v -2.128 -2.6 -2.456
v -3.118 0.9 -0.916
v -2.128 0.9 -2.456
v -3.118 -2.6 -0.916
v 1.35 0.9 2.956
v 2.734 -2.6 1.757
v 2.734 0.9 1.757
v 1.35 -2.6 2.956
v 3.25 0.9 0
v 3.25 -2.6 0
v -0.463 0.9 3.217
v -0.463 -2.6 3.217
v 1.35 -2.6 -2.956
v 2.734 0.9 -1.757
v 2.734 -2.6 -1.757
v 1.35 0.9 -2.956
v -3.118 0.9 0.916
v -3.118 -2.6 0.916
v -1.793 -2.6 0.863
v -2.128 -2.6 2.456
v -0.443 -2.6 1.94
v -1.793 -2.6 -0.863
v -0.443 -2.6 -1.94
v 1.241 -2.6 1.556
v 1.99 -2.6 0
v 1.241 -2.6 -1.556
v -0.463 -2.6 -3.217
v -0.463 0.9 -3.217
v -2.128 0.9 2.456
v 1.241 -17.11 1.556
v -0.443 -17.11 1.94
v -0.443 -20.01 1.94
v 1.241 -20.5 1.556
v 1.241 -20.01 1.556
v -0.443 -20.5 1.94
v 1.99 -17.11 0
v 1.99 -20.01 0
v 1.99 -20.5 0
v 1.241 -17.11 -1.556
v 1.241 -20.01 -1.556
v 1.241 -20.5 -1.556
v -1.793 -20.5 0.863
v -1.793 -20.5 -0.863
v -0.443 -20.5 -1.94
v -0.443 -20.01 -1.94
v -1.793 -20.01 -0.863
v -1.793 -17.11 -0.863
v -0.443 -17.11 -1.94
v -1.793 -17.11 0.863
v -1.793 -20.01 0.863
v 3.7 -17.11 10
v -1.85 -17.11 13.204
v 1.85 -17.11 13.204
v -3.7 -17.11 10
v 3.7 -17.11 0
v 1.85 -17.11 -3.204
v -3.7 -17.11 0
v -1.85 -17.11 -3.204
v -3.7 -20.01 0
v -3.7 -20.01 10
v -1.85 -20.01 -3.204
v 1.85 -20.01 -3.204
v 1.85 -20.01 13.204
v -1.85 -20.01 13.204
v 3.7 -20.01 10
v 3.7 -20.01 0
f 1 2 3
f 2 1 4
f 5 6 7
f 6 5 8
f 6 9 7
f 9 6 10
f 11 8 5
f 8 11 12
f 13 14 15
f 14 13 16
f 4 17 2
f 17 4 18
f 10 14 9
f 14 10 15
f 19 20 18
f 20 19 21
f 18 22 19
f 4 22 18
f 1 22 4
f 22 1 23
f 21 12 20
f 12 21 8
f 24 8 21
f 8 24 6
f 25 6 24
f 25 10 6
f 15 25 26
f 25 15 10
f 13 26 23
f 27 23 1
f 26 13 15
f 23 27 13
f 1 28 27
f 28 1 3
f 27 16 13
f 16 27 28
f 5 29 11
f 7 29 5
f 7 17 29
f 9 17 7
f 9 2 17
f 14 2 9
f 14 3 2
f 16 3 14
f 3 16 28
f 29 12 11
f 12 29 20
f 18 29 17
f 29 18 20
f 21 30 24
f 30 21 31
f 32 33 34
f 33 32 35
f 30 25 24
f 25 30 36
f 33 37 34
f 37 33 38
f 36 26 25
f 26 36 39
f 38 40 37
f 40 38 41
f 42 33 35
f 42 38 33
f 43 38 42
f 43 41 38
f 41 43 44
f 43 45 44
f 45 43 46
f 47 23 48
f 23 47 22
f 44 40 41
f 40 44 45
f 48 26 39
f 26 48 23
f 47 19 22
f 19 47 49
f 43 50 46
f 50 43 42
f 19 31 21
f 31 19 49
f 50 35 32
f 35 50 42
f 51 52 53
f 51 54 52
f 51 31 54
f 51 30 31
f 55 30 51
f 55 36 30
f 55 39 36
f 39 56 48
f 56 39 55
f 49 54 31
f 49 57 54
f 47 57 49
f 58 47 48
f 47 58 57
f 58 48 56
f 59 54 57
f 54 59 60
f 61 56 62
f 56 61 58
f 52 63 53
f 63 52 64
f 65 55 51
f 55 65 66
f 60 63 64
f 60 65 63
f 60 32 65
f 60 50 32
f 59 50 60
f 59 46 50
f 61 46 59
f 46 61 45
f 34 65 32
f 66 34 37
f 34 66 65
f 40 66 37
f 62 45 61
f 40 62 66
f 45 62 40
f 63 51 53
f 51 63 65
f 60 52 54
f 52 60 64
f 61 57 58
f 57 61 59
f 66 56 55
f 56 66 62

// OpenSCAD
// This file is part of Cyclone PCB Factory: an open-source 3D printable CNC machine for PCB manufacture
// http://reprap.org/wiki/Cyclone_PCB_Factory
// Original author: Carlosgs (http://carlosgs.es)
// License: CC BY-SA 4.0 (Attribution-ShareAlike 4.0 International, http://creativecommons.org/licenses/by-sa/4.0/)
// Designed with http://www.openscad.org/

include <MCAD/nuts_and_bolts.scad>

module hole_for_screw(size=3,length=20,nutDepth=5,nutAddedLen=0,captiveLen=0,tolerance=0.5) {
	radius = METRIC_NUT_AC_WIDTHS[size]/2+tolerance;
	height = METRIC_NUT_THICKNESS[size]+tolerance;
	translate([0,-length/2,0]) {
	translate([0,-length/2+height+nutAddedLen+nutDepth-0.01,0])
		scale([1,(height+nutAddedLen)/height,1])
			rotate([90,0,0])
				hull() {
					nutHole(size=size, tolerance=tolerance, proj=-1);
					translate([0,captiveLen,0])
						nutHole(size=size, tolerance=tolerance, proj=-1);
				}
	translate([0,length/2-2.6,0])
		rotate([90,0,0])
			render() boltHole(size=size, length=length-2.6+0.5, tolerance=tolerance, proj=-1);
	}
}

hole_for_screw(size=3,length=20,nutDepth=0,nutAddedLen=0,captiveLen=10);
